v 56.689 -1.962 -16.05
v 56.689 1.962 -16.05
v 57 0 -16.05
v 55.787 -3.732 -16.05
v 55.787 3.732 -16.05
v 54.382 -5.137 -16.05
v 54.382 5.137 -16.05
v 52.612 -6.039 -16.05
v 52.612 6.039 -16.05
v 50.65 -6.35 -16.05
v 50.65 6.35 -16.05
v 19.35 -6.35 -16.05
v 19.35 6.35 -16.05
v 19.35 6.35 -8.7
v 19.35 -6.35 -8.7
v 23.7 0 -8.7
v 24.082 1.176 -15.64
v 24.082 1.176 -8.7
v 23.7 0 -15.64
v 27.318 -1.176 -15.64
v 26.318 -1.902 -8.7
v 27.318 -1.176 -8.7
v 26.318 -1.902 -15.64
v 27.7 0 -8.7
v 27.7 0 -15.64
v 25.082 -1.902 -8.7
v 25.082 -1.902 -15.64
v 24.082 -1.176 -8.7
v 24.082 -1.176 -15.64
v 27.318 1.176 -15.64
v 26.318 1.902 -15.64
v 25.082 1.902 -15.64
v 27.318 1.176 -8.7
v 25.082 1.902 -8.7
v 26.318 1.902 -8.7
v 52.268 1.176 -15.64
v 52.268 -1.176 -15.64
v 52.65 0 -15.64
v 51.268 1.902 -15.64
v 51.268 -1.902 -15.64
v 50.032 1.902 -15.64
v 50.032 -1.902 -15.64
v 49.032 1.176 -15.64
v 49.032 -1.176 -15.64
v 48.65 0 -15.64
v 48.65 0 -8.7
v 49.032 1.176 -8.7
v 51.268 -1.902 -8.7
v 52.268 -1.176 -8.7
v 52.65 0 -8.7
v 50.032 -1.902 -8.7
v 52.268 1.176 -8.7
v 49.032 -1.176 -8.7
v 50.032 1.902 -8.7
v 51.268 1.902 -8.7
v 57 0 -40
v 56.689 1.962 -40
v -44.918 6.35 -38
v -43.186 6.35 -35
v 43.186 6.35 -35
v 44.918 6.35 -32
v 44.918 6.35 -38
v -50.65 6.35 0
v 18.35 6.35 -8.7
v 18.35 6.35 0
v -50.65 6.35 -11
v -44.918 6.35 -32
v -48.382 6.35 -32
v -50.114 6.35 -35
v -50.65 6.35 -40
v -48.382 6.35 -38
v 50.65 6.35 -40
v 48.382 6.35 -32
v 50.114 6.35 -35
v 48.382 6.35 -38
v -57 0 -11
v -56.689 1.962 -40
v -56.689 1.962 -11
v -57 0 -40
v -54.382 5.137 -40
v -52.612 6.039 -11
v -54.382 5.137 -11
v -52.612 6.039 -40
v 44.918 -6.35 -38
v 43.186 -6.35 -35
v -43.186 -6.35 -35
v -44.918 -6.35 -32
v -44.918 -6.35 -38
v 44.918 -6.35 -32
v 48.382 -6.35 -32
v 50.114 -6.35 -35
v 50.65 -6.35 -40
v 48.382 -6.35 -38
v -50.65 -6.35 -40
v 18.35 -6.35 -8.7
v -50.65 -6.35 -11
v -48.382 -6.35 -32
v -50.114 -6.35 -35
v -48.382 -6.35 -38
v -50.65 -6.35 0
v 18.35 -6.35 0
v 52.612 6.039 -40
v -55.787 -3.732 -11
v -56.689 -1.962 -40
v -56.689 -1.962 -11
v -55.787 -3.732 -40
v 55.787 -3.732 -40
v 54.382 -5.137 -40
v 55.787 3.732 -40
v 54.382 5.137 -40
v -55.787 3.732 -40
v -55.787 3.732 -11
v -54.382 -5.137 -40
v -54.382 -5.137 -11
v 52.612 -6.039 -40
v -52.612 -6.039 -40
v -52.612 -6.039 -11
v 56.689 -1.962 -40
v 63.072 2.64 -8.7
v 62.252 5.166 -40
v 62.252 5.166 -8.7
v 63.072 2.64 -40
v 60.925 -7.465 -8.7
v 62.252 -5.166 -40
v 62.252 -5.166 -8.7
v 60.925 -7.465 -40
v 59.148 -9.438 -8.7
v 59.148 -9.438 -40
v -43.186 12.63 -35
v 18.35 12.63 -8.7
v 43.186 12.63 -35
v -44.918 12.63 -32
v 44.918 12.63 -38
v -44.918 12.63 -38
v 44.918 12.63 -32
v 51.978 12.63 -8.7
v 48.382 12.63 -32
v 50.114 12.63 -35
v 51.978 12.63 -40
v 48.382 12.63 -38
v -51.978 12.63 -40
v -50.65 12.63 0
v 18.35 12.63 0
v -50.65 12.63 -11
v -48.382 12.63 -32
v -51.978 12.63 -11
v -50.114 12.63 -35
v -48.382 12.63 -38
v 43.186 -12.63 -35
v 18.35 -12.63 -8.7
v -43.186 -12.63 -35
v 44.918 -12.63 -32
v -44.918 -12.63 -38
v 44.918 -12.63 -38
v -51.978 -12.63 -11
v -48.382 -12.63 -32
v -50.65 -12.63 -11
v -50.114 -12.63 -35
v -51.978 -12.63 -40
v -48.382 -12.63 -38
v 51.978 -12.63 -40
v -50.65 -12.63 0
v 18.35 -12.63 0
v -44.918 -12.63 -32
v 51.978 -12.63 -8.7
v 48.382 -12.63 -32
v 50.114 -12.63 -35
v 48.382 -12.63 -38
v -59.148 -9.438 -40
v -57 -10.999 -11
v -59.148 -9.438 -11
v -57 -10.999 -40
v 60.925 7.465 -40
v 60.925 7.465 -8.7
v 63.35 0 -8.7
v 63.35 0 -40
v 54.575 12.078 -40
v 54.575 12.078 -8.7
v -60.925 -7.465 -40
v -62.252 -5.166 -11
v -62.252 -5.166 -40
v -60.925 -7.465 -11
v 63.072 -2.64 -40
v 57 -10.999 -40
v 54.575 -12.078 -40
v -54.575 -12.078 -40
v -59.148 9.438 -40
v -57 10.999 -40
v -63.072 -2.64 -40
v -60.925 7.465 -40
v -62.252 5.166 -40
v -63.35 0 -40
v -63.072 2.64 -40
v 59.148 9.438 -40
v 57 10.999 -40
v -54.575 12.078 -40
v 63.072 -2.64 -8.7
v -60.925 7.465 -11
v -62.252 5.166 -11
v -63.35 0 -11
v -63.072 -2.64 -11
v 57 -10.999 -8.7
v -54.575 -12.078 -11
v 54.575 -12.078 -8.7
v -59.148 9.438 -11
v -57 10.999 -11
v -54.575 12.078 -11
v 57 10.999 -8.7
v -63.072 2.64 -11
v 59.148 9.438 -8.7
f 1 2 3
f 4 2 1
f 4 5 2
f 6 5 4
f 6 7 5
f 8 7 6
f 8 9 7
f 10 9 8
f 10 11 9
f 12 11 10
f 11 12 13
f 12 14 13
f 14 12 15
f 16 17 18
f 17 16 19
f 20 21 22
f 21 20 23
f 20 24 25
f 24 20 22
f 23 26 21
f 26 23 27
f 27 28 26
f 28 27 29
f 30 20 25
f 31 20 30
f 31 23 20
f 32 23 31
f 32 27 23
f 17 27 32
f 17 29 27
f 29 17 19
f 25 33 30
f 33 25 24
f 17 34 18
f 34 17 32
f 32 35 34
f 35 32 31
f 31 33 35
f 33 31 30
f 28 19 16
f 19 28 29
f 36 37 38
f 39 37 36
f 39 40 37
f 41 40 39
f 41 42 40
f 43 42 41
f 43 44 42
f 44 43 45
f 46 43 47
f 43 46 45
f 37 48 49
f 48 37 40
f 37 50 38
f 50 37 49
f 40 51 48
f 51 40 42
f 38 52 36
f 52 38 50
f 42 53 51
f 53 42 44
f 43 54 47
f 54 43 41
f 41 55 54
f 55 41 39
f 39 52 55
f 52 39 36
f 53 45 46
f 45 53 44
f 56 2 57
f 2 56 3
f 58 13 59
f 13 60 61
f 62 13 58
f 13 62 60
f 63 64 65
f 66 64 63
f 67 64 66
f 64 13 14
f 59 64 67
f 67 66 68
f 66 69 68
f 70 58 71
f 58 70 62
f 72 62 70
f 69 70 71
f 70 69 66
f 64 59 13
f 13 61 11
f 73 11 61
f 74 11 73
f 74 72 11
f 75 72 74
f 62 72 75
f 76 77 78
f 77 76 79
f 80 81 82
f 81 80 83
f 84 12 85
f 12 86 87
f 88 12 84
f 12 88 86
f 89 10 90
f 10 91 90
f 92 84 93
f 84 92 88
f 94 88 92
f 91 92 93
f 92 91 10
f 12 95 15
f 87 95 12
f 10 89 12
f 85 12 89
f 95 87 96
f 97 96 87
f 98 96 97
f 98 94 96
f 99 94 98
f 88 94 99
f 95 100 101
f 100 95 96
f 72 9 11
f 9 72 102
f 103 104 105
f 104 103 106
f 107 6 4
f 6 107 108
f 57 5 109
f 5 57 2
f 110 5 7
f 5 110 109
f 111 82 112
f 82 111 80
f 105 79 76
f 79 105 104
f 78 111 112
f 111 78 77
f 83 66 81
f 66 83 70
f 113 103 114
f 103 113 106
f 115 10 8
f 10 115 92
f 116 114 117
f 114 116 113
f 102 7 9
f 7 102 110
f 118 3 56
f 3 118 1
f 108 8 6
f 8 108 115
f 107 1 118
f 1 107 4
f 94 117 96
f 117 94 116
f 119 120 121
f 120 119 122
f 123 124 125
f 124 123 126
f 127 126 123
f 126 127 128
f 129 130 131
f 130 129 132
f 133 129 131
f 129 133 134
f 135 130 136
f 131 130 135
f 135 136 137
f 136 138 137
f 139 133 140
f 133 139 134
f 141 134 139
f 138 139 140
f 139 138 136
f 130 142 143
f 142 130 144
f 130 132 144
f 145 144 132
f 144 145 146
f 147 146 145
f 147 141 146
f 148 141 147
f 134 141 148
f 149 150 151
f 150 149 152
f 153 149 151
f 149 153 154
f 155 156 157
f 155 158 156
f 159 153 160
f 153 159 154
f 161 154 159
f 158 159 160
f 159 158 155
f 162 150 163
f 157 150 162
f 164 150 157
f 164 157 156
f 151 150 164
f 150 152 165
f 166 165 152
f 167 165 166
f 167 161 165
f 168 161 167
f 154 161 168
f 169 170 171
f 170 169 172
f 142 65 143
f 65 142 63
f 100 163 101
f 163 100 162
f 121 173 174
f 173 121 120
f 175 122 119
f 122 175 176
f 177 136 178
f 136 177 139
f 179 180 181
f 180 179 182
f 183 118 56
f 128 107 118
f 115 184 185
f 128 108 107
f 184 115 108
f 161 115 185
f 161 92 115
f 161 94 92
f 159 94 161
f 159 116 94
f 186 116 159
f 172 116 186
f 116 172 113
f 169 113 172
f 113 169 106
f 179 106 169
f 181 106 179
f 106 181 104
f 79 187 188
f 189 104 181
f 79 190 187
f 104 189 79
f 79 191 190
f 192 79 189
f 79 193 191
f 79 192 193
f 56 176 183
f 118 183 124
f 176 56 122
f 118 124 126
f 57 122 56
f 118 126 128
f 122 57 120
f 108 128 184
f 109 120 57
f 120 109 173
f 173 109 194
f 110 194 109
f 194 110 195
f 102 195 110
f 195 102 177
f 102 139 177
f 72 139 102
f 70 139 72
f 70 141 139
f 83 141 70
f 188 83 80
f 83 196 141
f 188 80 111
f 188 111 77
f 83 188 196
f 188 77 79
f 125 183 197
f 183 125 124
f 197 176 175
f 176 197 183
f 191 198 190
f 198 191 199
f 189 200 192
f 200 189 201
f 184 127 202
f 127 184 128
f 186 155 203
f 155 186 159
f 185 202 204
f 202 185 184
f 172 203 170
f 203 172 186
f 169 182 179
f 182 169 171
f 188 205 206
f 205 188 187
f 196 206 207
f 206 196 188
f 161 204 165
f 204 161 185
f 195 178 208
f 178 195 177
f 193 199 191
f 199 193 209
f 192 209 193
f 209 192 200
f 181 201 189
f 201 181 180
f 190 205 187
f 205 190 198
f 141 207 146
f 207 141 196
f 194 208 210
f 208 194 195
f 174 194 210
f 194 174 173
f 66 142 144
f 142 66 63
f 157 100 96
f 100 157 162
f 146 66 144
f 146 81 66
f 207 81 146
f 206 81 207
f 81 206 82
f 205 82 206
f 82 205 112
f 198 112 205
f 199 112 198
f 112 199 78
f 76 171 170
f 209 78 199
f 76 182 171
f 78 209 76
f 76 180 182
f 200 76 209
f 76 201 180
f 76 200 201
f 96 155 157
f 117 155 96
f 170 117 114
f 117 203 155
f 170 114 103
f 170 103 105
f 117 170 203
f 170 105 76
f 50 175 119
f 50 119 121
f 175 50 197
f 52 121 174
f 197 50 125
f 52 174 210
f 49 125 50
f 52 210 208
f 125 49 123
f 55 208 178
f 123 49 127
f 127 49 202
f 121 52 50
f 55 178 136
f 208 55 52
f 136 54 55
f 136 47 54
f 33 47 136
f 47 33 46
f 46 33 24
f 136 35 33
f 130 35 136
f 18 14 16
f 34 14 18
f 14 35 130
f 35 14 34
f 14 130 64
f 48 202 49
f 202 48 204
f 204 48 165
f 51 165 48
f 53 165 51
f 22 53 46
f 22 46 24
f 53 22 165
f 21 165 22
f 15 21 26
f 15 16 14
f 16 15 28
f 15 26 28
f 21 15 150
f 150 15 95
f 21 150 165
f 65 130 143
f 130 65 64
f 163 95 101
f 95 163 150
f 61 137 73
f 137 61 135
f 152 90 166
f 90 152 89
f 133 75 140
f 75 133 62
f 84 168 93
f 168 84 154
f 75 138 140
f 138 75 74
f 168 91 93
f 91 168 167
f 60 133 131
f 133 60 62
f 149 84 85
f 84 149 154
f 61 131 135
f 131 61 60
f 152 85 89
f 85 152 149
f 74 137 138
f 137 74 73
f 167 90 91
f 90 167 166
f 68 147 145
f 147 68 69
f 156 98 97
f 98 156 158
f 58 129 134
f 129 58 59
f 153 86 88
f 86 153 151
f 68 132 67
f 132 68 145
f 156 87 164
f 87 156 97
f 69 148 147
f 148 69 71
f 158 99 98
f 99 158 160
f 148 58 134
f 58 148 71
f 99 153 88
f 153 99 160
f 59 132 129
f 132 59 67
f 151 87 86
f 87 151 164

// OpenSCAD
// [FL_INDEX: keywords="openscad, 3d_parametric, Parametric_Framing_Fingers, csg_solid" | COT="Parametric OpenSCAD design from 3DCodeverse"]
// Title: Parametric Framing Fingers

// What type of framing finger?
part=1; // [1:Top Finger, 2:Bottom Finger, 3:Side Finger, 4:Bar Holder]

// Distance from back of glass to wall.
height=40;

// How tall is the frame?
frame_height_v=590;

// How wide is the frame?
frame_width_v=742;

// How tall is the space in the frame for the glass?
glass_height_v=461;

// How wide is the space in the frame for the glass?
glass_width_v=612;

// How deep is the glass from the back of the frame?
glass_offset=8.7;

// Monitor thickness at the top edge.
monitor_thickness_top=11;

// Monitor thickness at the bottom edge.
monitor_thickness_bottom=8;

// Monitor width
monitor_width_v=545;

// Monitor height
monitor_height_v=322;

// How much wiggle room?
wiggle=0.5;

// Layer thickness.
layer=0.41;

// Total finger width.
width=25.4;

/* [Hidden] */

inch=25.4;
thickness=width/4;
screw_depth=inch / 4 + 1;

frame_height=frame_height_v + wiggle;
frame_width=frame_width_v + wiggle;
glass_height=glass_height_v - wiggle;
glass_width=glass_width_v - wiggle;
monitor_width=monitor_width_v + wiggle;
monitor_height=monitor_height_v + wiggle;

frame_hook=(frame_height - glass_height)/2 - height/2;

module ovoid(len,width,height) {
  hull() {
    translate([(len-width)/2, 0, ]) cylinder(r=width/2, h=height);
    translate([(width-len)/2, 0, ]) cylinder(r=width/2, h=height);
  }
}

module basic_finger(width, offset, monitor_thickness) {
  length = frame_hook+ offset + width/2;
  difference() {
    ovoid(length, width, height);
    translate([0,0,-1]) 
      difference() {
      ovoid(length-thickness*2, width - thickness*2, height * 2);
      translate([-length/2,-width/2,-1+glass_offset]) {
	difference() {
	  cube([length - 1, width,screw_depth + 2]);
	  translate([width/2, width/2, 0]) cylinder(r=2, $fn=10, h=screw_depth+2-layer);
	  translate([length - width/2, width/2, 0]) cylinder(r=2, $fn=10, h=screw_depth+2-layer);
	  translate([length/2, width/2, 0]) cylinder(r=2, $fn=10, h=screw_depth+2-layer);
	}
      }
    }

    translate([0,0,0]) cube([length + 2,width+2,glass_offset * 2], center=true);

    translate([length/2-width/2-4,0,height - 5])
      rotate([90,0,0])
      cylinder(r=3 / cos(180/6), $fn=6, h=width + 2, center=true);

    translate([0,0,height - 5])
      rotate([90,0,0])
      cylinder(r=3 / cos(180/6), $fn=6, h=width + 2, center=true);

    rotate([0,0,180])
      translate([length/2-width/2-4,0,height - 5])
      rotate([90,0,0])
      cylinder(r=3 / cos(180/6), $fn=6, h=width + 2, center=true);
  }
}


module finger(width, offset, monitor_thickness) {
  length = frame_hook+ offset + width/2;
  difference() {
    ovoid(length, width, height);
    translate([0,0,-1]) 
      difference() {
      ovoid(length-thickness*2, width - thickness*2, height * 2);
      translate([length/2-frame_hook+1,-width/2,-1+glass_offset]) {
	difference() {
	  cube([frame_hook - thickness/2,width,screw_depth + 2]);
	  translate([thickness, width/2, 0]) cylinder(r=2, $fn=10, h=screw_depth+2-layer);
	  translate([frame_hook - width/2 -1, width/2, 0]) cylinder(r=2, $fn=10, h=screw_depth+2-layer);
	}
      }
    }

    translate([-length/2,0,0]) cube([width,width+2,monitor_thickness * 2], center=true);
    translate([length/2,0,0]) cube([frame_hook*2,width+2,glass_offset * 2], center=true);

    translate([length/2-width/2-4,0,height - 5])
      rotate([90,0,0])
      cylinder(r=3 / cos(180/6), $fn=6, h=width + 2, center=true);

    rotate([0,0,180])
      translate([length/2-width/2-4,0,height - 5])
      rotate([90,0,0])
      cylinder(r=3 / cos(180/6), $fn=6, h=width + 2, center=true);
  }
}

rotate([180,0,0]) {

// Fingers for the top edge
if(part == 1) finger(width, (glass_height-monitor_height)/2, monitor_thickness_top);

// Fingers for the bottom edge
if(part == 2) finger(width, (glass_height-monitor_height)/2, monitor_thickness_bottom);

// Fingers for the side
if(part == 3) finger(width, (glass_width-monitor_width)/2, monitor_thickness_bottom);

// Bar holder
if(part == 4) basic_finger(width, (glass_width-monitor_width)/2, 0);

}
